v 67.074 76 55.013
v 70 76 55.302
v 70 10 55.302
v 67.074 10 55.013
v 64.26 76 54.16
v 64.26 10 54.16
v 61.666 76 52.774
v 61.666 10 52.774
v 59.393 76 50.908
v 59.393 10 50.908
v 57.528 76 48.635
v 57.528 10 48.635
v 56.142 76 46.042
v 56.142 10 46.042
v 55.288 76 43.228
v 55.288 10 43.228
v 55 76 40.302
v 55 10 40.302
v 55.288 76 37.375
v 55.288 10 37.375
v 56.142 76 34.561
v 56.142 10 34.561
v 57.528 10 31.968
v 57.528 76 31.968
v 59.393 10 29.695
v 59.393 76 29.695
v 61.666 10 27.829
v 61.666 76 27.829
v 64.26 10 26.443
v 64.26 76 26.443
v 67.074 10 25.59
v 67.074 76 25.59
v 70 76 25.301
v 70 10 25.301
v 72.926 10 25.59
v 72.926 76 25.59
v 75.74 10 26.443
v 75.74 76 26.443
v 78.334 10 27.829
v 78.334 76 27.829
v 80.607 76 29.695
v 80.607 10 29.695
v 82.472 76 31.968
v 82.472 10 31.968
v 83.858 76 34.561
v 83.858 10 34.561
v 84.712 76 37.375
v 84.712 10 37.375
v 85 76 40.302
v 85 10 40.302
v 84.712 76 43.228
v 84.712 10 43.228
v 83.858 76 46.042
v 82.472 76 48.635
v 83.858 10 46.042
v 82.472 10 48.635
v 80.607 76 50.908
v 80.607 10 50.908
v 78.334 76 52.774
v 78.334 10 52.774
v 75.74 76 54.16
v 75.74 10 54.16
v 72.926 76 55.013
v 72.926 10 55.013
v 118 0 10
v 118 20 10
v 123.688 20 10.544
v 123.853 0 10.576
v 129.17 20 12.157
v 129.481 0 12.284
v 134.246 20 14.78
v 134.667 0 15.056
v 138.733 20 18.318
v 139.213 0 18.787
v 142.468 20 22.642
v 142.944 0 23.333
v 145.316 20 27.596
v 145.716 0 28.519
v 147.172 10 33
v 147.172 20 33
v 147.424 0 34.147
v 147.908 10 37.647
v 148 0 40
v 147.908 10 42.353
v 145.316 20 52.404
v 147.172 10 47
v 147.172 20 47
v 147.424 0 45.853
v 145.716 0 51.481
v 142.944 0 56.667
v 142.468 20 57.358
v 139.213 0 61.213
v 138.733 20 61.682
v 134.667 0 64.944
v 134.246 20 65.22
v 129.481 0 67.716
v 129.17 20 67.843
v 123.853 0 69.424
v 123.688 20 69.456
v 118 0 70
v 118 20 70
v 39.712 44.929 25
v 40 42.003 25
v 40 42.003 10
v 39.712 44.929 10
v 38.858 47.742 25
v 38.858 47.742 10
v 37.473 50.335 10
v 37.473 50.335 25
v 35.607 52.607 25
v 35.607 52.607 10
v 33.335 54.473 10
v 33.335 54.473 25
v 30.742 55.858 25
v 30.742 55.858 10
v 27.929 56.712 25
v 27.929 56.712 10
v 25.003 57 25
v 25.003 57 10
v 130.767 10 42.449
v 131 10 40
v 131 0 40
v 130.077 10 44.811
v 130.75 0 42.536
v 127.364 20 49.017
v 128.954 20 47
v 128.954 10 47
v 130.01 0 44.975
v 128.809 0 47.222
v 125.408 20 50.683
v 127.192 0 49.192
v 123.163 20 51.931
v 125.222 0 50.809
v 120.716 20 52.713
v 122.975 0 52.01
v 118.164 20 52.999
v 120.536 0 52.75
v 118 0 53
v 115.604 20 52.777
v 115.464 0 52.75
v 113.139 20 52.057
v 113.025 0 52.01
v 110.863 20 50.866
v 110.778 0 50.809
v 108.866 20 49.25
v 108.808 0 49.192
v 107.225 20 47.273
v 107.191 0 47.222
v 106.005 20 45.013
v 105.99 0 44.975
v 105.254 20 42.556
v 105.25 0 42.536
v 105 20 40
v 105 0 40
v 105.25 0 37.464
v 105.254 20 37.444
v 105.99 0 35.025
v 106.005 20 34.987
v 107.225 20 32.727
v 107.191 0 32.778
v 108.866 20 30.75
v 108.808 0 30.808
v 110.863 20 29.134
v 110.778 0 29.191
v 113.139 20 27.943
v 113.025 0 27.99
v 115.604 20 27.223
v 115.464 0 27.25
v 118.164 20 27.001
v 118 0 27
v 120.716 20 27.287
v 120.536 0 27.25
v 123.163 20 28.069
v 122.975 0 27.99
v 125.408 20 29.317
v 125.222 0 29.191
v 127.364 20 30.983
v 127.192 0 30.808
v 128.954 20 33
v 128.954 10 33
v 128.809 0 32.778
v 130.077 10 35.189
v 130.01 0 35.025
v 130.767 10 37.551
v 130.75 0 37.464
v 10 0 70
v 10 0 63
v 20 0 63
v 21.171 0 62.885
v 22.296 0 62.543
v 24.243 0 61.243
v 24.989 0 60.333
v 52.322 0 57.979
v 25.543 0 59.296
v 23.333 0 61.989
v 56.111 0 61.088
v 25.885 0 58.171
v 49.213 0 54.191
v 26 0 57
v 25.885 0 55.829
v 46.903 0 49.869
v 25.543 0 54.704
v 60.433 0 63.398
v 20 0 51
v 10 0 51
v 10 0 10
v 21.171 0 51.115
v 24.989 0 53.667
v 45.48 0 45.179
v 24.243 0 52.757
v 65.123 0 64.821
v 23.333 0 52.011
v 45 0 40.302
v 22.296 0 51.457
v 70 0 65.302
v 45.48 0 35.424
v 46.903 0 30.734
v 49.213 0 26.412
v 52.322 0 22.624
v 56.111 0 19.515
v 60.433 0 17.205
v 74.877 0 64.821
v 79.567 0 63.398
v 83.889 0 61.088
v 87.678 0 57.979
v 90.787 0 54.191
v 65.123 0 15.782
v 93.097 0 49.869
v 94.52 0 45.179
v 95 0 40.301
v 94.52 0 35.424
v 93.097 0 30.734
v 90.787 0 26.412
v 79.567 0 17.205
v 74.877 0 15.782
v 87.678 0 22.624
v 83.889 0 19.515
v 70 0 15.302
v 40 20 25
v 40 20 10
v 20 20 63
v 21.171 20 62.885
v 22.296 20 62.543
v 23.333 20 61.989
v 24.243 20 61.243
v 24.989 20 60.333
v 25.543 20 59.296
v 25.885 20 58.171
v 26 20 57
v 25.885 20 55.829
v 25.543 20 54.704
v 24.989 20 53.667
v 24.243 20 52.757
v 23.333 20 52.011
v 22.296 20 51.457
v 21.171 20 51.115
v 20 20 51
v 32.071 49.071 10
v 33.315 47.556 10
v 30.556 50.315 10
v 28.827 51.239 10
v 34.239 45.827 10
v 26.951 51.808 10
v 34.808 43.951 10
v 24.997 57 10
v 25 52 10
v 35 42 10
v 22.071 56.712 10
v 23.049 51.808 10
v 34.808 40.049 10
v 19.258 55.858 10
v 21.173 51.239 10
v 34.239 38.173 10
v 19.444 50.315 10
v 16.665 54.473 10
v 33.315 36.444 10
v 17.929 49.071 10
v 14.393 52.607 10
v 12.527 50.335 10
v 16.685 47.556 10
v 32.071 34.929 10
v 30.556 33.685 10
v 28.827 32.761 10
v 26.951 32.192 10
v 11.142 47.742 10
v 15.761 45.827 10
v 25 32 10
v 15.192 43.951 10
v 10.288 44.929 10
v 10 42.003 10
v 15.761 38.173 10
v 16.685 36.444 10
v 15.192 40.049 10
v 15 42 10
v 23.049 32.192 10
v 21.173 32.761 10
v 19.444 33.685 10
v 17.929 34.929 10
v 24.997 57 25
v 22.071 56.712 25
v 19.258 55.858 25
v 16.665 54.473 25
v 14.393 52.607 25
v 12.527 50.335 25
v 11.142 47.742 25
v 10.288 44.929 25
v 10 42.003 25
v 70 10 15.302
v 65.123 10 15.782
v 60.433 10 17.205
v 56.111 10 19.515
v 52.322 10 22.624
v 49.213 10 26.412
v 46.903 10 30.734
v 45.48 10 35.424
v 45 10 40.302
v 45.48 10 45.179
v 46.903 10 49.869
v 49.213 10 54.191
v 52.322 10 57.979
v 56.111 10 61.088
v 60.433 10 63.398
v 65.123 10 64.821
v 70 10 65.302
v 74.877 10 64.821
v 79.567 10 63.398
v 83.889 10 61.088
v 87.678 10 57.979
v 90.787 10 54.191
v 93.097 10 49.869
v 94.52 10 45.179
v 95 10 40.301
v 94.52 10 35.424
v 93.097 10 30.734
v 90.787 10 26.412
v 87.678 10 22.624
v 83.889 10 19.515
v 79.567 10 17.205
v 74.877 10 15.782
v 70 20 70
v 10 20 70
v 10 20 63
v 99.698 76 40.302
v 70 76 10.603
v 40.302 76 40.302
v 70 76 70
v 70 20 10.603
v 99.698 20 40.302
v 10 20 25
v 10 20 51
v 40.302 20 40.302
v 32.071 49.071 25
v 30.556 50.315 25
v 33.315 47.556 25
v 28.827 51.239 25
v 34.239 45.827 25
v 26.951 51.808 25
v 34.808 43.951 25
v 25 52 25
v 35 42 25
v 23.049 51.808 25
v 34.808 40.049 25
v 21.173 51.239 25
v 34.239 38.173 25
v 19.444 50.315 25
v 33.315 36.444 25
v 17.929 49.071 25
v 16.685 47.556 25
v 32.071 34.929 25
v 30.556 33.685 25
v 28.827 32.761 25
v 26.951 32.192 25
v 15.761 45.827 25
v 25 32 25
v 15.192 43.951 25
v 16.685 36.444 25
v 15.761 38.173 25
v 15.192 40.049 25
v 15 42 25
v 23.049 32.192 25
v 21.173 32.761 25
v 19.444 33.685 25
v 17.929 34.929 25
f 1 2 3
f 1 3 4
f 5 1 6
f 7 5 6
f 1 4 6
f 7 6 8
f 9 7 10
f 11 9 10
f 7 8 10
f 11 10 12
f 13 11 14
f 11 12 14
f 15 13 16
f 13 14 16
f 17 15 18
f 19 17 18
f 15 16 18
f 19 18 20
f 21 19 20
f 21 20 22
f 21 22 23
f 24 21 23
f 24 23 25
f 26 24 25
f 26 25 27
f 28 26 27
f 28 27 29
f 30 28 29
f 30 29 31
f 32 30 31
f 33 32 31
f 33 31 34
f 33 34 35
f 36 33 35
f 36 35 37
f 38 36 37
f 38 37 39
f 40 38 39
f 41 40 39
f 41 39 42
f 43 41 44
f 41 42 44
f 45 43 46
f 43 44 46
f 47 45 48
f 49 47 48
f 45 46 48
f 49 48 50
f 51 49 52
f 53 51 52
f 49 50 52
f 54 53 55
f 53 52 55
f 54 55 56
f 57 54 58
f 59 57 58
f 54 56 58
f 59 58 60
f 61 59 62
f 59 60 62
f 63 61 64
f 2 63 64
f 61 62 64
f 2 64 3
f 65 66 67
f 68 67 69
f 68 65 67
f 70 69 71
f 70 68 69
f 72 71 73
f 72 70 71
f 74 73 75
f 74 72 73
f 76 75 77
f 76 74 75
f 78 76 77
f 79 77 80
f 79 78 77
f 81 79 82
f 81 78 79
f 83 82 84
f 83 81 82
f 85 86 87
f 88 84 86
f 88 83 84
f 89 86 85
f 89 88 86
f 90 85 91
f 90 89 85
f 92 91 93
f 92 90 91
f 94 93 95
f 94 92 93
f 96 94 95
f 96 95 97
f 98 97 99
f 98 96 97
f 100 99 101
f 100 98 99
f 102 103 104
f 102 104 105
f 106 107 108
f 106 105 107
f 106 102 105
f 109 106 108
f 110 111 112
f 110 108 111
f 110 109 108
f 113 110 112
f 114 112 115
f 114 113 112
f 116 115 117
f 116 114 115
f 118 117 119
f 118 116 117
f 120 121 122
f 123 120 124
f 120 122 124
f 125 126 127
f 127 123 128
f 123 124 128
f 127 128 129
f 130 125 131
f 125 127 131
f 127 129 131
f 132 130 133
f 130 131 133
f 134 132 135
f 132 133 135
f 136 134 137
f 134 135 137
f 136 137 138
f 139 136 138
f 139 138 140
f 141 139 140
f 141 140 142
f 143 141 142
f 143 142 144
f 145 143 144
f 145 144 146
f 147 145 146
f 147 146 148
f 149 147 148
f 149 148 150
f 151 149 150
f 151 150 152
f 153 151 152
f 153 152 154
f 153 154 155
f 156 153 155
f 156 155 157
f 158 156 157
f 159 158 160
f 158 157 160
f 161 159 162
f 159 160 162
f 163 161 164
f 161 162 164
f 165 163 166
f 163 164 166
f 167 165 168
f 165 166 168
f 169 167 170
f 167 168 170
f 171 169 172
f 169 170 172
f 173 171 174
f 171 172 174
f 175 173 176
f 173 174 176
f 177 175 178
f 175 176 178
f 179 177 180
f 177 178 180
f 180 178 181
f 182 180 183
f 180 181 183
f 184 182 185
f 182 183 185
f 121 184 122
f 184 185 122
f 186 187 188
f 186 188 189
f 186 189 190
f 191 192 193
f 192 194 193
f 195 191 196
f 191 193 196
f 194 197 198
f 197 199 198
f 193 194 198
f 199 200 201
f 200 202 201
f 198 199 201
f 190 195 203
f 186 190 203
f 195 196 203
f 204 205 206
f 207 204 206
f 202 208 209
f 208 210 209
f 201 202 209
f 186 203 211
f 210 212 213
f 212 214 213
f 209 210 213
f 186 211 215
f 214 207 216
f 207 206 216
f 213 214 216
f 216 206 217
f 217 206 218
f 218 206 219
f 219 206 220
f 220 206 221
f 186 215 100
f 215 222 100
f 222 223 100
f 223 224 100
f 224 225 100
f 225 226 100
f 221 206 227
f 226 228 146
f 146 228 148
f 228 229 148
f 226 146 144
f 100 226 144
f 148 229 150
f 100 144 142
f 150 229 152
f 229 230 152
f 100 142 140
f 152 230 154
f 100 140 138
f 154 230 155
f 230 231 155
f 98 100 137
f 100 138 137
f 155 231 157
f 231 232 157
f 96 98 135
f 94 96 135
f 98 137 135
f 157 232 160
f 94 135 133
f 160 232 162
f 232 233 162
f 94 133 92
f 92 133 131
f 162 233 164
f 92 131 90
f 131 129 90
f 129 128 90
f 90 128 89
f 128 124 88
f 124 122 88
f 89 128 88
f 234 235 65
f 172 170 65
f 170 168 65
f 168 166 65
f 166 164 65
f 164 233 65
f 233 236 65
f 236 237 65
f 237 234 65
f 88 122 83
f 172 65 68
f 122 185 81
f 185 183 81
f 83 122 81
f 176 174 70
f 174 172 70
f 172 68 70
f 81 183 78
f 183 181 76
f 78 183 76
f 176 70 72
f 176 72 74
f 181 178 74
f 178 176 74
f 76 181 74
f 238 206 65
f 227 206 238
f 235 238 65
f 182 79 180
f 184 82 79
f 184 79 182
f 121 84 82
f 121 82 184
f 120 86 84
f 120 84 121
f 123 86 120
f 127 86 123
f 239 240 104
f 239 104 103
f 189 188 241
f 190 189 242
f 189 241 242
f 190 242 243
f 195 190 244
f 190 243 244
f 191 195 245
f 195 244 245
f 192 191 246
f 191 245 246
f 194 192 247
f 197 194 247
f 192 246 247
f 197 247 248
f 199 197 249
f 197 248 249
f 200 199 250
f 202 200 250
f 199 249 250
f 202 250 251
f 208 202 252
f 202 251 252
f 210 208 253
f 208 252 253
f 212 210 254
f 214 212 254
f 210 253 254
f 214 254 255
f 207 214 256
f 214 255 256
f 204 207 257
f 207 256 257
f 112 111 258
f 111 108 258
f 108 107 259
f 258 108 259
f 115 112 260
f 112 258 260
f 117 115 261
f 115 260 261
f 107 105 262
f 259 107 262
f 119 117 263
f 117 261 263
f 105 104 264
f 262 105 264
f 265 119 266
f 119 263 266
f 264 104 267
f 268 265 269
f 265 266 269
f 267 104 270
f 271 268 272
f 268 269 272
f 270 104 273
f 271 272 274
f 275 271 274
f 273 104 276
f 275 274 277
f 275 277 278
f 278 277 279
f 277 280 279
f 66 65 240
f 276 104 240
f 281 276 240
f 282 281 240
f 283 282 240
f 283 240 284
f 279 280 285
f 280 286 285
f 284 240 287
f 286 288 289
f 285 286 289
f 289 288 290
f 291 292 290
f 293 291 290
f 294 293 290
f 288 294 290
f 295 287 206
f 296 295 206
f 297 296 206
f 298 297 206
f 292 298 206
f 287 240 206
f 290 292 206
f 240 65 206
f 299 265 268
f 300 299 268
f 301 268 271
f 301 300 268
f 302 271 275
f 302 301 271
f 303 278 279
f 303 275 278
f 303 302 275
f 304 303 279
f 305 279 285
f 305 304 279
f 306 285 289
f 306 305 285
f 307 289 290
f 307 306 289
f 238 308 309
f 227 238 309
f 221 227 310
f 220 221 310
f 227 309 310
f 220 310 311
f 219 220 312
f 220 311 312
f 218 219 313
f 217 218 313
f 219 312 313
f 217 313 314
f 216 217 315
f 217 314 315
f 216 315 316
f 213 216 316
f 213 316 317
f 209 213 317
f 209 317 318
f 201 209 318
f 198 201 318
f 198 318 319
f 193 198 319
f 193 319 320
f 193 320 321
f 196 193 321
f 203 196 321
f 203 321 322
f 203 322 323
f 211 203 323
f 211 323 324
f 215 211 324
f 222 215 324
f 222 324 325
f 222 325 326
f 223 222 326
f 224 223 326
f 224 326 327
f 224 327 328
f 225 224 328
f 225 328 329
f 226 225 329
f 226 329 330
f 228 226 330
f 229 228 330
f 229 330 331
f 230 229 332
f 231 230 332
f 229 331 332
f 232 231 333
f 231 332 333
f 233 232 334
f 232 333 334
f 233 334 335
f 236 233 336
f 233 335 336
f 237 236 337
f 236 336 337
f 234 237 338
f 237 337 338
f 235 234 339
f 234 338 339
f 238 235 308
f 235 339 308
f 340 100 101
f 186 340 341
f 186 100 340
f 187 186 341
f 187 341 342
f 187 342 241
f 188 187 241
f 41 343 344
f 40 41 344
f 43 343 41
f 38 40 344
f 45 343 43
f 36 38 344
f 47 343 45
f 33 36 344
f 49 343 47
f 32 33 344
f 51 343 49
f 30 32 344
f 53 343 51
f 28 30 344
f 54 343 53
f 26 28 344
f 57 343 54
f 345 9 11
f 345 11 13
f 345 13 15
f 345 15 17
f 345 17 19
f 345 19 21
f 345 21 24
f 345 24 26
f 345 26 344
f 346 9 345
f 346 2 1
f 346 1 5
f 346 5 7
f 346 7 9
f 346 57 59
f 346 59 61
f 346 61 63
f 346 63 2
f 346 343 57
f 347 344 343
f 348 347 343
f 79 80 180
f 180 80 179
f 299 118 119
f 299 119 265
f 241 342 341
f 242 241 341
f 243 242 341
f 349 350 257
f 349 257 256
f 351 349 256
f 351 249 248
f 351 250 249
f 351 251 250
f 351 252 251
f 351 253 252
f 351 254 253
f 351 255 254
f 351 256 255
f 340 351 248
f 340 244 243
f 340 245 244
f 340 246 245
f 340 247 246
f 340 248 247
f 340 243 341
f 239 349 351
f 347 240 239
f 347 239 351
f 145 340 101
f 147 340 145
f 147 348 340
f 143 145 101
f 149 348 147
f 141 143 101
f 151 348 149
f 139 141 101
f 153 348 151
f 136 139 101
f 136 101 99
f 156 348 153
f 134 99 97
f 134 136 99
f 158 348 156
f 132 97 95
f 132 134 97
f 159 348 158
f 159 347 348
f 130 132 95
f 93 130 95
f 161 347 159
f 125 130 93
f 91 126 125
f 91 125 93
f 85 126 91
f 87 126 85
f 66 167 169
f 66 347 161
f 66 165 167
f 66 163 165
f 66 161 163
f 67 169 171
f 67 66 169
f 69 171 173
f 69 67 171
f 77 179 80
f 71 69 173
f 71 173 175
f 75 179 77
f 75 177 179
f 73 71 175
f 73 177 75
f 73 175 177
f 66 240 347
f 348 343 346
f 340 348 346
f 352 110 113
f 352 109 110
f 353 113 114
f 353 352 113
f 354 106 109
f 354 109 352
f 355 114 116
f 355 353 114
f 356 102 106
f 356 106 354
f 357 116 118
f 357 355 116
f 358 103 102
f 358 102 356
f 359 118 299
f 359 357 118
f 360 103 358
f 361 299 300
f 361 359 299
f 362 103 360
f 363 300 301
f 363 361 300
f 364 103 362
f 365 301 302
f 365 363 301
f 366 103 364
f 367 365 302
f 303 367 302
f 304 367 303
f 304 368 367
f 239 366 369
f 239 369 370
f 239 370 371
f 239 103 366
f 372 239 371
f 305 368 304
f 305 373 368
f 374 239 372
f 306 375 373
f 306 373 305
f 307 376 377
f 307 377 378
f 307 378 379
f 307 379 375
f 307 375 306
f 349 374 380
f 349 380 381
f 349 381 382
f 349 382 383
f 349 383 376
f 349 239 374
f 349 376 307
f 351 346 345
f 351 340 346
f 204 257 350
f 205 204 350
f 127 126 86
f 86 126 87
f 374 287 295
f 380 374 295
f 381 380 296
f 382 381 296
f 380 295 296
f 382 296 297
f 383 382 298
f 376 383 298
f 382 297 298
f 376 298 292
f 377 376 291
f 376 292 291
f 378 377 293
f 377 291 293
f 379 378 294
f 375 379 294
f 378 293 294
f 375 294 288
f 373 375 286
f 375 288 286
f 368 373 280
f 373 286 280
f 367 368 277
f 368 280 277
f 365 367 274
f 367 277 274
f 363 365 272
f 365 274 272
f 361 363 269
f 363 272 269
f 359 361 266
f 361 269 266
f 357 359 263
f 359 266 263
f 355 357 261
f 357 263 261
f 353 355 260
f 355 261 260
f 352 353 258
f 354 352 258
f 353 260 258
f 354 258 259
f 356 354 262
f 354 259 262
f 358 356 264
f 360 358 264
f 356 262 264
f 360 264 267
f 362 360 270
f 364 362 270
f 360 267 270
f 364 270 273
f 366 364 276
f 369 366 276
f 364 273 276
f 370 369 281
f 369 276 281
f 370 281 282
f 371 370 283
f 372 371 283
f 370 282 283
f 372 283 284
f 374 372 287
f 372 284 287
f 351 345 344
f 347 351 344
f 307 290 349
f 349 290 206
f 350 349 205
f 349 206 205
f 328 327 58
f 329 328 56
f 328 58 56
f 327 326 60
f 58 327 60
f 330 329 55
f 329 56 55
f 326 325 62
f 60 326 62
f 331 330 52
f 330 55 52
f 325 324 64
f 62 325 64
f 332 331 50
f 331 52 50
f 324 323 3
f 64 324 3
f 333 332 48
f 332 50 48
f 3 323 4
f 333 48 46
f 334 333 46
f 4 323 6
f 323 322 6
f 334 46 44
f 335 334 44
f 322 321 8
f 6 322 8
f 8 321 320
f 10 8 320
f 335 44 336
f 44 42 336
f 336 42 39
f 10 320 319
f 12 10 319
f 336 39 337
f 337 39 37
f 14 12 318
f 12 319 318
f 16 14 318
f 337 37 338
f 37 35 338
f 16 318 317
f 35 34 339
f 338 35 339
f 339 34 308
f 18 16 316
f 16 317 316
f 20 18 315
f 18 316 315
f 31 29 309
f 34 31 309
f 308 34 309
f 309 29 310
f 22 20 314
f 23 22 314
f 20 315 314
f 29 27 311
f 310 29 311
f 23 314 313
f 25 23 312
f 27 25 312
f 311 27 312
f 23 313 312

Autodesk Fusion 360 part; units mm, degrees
sketch "Sketch1" plane through (0, 0, 0) normal (0, 1, 0) x (1, 0, 0)
  line L0 (10, -10) -> (118, -10)
  line L1 (148, -40) -> (148, -40)
  line L2 (118, -70) -> (10, -70)
  line L3 (10, -70) -> (10, -10)
  arc A0 (148, -40) -> (118, -10) centre (118, -40) ccw
  arc A1 (118, -70) -> (148, -40) centre (118, -40) ccw
  circle A2 centre (118, -40) radius 13
  point P0 (148, -10)
  dimension "d1" = 138
  dimension "d2" = 60
  dimension "d3" = 30
  dimension "d4" = 30
  dimension "d5" = 26
extrude "Extrude1" add sketch "Sketch1" along normal blind 20
sketch "Sketch2" plane through (0, 20, 0) normal (0, 1, 0) x (-1, 0, 0)
  circle A0 centre (-118, 40) radius 13
  line L0 (-10, 70) -> (-118, 70)
  arc A1 (-118, 70) -> (-118, 10) centre (-118, 40) ccw
  line L1 (-118, 10) -> (-10, 10)
  line L2 (-10, 10) -> (-10, 70)
  line L3 (-118, 47) -> (-155, 47)
  arc A2 (-155, 47) -> (-155, 33) centre (-155, 40) ccw
  line L4 (-155, 33) -> (-118, 33)
  arc A3 (-118, 33) -> (-118, 47) centre (-118, 40) ccw
  line L5 (-118, 40) -> (-155, 40) construction
  dimension "d8" = 14
extrude "Extrude2" cut sketch "Sketch2" against normal blind 10 contours A0 A1 L3 L4
sketch "Sketch4" plane through (0, 20, 0) normal (0, 1, 0) x (-1, 0, 0)
  line L0 (-147.1719, 47) -> (-128.9545, 47)
  arc A0 (-128.9545, 33) -> (-128.9545, 47) centre (-118, 40) ccw
  line L1 (-128.9545, 33) -> (-147.1719, 33)
  arc A1 (-147.1719, 33) -> (-118, 10) centre (-118, 40) ccw
  line L2 (-118, 10) -> (-10, 10)
  line L3 (-10, 10) -> (-10, 70)
  line L4 (-10, 70) -> (-118, 70)
  arc A2 (-118, 70) -> (-147.1719, 47) centre (-118, 40) ccw
  line L5 (-10, 70) -> (-70, 70) construction
  line L6 (-70, 70) -> (-70, 10) construction
  line L7 (-70, 70) -> (-40.3015, 40.3015) construction
  line L8 (-70, 70) -> (-28, 70) construction
  line L9 (-70, 70) -> (-40.3015, 40.3015)
  line L10 (-40.3015, 40.3015) -> (-70, 10.603)
  line L11 (-70, 10.603) -> (-99.6985, 40.3015)
  line L12 (-99.6985, 40.3015) -> (-70, 70)
  dimension "d11" = 60
  dimension "d12" = 45
  dimension "d13" = 42
  dimension "d14" = 42
extrude "Extrude3" add sketch "Sketch4" along normal blind 56 contours L9 L10 L11 L12
hole "Hole1" at (70, 76, 40.3015) direction (0, -1, 0) diameter 30 depth 90 tip angle 180
hole "Hole2" at (70, 0, 40.3015) direction (0, 1, 0) diameter 50 depth 10 tip angle 180
sketch "Sketch5" plane through (0, 20, 0) normal (0, 1, 0) x (-1, 0, 0)
  line L0 (-147.1719, 47) -> (-128.9545, 47)
  arc A0 (-128.9545, 33) -> (-128.9545, 47) centre (-118, 40) ccw
  line L1 (-128.9545, 33) -> (-147.1719, 33)
  arc A1 (-147.1719, 33) -> (-118, 10) centre (-118, 40) ccw
  line L2 (-118, 10) -> (-10, 10)
  line L3 (-10, 10) -> (-10, 70)
  line L4 (-10, 70) -> (-70, 70)
  line L5 (-70, 70) -> (-40.3015, 40.3015)
  line L6 (-40.3015, 40.3015) -> (-70, 10.603)
  line L7 (-70, 10.603) -> (-99.6985, 40.3015)
  line L8 (-99.6985, 40.3015) -> (-70, 70)
  line L9 (-70, 70) -> (-118, 70)
  arc A2 (-118, 70) -> (-147.1719, 47) centre (-118, 40) ccw
  line L10 (-10, 57) -> (-10, 63)
  line L11 (-10, 63) -> (-20, 63)
  line L12 (-20, 51) -> (-10, 51)
  arc A3 (-10, 51) -> (-10, 63) centre (-10, 57) ccw
  line L13 (-10, 63) -> (-20, 63)
  arc A4 (-20, 63) -> (-20, 51) centre (-20, 57) ccw
  line L14 (-20, 57) -> (-10, 57) construction
  dimension "d24" = 6
  dimension "d25" = 10
extrude "Extrude4" cut sketch "Sketch5" against normal blind 20 contours L3 L10 L11 L12 L13 A4
sketch "Sketch6" plane through (0, 20, 0) normal (0, 1, 0) x (-1, 0, 0)
  line L0 (-20, 63) -> (-10, 63)
  line L1 (-10, 63) -> (-10, 70)
  line L2 (-10, 70) -> (-70, 70)
  line L3 (-70, 70) -> (-40.3015, 40.3015)
  line L4 (-40.3015, 40.3015) -> (-70, 10.603)
  line L5 (-70, 10.603) -> (-99.6985, 40.3015)
  line L6 (-99.6985, 40.3015) -> (-70, 70)
  line L7 (-70, 70) -> (-118, 70)
  arc A0 (-118, 70) -> (-147.1719, 47) centre (-118, 40) ccw
  line L8 (-147.1719, 47) -> (-128.9545, 47)
  arc A1 (-128.9545, 33) -> (-128.9545, 47) centre (-118, 40) ccw
  line L9 (-128.9545, 33) -> (-147.1719, 33)
  arc A2 (-147.1719, 33) -> (-118, 10) centre (-118, 40) ccw
  line L10 (-118, 10) -> (-10, 10)
  line L11 (-10, 10) -> (-10, 51)
  line L12 (-10, 51) -> (-20, 51)
  arc A3 (-20, 63) -> (-20, 51) centre (-20, 57) ccw
  line L13 (-10, 10) -> (-40, 10)
  line L14 (-40, 10) -> (-40, 25)
  line L15 (-40, 25) -> (-10, 25)
  line L16 (-10, 25) -> (-10, 10)
  dimension "d28" = 30
  dimension "d29" = 15
extrude "Extrude5" add sketch "Sketch6" along normal blind 37 contours L10 L11 L13 L14 L15 L16
fillet "Fillet1" radius 15 2 edges at (10, 57, 17.5) (40, 57, 17.5)
hole "Hole3" at (25, 42, 25) direction (0, 0, -1) diameter 20 depth 130 tip angle 180
